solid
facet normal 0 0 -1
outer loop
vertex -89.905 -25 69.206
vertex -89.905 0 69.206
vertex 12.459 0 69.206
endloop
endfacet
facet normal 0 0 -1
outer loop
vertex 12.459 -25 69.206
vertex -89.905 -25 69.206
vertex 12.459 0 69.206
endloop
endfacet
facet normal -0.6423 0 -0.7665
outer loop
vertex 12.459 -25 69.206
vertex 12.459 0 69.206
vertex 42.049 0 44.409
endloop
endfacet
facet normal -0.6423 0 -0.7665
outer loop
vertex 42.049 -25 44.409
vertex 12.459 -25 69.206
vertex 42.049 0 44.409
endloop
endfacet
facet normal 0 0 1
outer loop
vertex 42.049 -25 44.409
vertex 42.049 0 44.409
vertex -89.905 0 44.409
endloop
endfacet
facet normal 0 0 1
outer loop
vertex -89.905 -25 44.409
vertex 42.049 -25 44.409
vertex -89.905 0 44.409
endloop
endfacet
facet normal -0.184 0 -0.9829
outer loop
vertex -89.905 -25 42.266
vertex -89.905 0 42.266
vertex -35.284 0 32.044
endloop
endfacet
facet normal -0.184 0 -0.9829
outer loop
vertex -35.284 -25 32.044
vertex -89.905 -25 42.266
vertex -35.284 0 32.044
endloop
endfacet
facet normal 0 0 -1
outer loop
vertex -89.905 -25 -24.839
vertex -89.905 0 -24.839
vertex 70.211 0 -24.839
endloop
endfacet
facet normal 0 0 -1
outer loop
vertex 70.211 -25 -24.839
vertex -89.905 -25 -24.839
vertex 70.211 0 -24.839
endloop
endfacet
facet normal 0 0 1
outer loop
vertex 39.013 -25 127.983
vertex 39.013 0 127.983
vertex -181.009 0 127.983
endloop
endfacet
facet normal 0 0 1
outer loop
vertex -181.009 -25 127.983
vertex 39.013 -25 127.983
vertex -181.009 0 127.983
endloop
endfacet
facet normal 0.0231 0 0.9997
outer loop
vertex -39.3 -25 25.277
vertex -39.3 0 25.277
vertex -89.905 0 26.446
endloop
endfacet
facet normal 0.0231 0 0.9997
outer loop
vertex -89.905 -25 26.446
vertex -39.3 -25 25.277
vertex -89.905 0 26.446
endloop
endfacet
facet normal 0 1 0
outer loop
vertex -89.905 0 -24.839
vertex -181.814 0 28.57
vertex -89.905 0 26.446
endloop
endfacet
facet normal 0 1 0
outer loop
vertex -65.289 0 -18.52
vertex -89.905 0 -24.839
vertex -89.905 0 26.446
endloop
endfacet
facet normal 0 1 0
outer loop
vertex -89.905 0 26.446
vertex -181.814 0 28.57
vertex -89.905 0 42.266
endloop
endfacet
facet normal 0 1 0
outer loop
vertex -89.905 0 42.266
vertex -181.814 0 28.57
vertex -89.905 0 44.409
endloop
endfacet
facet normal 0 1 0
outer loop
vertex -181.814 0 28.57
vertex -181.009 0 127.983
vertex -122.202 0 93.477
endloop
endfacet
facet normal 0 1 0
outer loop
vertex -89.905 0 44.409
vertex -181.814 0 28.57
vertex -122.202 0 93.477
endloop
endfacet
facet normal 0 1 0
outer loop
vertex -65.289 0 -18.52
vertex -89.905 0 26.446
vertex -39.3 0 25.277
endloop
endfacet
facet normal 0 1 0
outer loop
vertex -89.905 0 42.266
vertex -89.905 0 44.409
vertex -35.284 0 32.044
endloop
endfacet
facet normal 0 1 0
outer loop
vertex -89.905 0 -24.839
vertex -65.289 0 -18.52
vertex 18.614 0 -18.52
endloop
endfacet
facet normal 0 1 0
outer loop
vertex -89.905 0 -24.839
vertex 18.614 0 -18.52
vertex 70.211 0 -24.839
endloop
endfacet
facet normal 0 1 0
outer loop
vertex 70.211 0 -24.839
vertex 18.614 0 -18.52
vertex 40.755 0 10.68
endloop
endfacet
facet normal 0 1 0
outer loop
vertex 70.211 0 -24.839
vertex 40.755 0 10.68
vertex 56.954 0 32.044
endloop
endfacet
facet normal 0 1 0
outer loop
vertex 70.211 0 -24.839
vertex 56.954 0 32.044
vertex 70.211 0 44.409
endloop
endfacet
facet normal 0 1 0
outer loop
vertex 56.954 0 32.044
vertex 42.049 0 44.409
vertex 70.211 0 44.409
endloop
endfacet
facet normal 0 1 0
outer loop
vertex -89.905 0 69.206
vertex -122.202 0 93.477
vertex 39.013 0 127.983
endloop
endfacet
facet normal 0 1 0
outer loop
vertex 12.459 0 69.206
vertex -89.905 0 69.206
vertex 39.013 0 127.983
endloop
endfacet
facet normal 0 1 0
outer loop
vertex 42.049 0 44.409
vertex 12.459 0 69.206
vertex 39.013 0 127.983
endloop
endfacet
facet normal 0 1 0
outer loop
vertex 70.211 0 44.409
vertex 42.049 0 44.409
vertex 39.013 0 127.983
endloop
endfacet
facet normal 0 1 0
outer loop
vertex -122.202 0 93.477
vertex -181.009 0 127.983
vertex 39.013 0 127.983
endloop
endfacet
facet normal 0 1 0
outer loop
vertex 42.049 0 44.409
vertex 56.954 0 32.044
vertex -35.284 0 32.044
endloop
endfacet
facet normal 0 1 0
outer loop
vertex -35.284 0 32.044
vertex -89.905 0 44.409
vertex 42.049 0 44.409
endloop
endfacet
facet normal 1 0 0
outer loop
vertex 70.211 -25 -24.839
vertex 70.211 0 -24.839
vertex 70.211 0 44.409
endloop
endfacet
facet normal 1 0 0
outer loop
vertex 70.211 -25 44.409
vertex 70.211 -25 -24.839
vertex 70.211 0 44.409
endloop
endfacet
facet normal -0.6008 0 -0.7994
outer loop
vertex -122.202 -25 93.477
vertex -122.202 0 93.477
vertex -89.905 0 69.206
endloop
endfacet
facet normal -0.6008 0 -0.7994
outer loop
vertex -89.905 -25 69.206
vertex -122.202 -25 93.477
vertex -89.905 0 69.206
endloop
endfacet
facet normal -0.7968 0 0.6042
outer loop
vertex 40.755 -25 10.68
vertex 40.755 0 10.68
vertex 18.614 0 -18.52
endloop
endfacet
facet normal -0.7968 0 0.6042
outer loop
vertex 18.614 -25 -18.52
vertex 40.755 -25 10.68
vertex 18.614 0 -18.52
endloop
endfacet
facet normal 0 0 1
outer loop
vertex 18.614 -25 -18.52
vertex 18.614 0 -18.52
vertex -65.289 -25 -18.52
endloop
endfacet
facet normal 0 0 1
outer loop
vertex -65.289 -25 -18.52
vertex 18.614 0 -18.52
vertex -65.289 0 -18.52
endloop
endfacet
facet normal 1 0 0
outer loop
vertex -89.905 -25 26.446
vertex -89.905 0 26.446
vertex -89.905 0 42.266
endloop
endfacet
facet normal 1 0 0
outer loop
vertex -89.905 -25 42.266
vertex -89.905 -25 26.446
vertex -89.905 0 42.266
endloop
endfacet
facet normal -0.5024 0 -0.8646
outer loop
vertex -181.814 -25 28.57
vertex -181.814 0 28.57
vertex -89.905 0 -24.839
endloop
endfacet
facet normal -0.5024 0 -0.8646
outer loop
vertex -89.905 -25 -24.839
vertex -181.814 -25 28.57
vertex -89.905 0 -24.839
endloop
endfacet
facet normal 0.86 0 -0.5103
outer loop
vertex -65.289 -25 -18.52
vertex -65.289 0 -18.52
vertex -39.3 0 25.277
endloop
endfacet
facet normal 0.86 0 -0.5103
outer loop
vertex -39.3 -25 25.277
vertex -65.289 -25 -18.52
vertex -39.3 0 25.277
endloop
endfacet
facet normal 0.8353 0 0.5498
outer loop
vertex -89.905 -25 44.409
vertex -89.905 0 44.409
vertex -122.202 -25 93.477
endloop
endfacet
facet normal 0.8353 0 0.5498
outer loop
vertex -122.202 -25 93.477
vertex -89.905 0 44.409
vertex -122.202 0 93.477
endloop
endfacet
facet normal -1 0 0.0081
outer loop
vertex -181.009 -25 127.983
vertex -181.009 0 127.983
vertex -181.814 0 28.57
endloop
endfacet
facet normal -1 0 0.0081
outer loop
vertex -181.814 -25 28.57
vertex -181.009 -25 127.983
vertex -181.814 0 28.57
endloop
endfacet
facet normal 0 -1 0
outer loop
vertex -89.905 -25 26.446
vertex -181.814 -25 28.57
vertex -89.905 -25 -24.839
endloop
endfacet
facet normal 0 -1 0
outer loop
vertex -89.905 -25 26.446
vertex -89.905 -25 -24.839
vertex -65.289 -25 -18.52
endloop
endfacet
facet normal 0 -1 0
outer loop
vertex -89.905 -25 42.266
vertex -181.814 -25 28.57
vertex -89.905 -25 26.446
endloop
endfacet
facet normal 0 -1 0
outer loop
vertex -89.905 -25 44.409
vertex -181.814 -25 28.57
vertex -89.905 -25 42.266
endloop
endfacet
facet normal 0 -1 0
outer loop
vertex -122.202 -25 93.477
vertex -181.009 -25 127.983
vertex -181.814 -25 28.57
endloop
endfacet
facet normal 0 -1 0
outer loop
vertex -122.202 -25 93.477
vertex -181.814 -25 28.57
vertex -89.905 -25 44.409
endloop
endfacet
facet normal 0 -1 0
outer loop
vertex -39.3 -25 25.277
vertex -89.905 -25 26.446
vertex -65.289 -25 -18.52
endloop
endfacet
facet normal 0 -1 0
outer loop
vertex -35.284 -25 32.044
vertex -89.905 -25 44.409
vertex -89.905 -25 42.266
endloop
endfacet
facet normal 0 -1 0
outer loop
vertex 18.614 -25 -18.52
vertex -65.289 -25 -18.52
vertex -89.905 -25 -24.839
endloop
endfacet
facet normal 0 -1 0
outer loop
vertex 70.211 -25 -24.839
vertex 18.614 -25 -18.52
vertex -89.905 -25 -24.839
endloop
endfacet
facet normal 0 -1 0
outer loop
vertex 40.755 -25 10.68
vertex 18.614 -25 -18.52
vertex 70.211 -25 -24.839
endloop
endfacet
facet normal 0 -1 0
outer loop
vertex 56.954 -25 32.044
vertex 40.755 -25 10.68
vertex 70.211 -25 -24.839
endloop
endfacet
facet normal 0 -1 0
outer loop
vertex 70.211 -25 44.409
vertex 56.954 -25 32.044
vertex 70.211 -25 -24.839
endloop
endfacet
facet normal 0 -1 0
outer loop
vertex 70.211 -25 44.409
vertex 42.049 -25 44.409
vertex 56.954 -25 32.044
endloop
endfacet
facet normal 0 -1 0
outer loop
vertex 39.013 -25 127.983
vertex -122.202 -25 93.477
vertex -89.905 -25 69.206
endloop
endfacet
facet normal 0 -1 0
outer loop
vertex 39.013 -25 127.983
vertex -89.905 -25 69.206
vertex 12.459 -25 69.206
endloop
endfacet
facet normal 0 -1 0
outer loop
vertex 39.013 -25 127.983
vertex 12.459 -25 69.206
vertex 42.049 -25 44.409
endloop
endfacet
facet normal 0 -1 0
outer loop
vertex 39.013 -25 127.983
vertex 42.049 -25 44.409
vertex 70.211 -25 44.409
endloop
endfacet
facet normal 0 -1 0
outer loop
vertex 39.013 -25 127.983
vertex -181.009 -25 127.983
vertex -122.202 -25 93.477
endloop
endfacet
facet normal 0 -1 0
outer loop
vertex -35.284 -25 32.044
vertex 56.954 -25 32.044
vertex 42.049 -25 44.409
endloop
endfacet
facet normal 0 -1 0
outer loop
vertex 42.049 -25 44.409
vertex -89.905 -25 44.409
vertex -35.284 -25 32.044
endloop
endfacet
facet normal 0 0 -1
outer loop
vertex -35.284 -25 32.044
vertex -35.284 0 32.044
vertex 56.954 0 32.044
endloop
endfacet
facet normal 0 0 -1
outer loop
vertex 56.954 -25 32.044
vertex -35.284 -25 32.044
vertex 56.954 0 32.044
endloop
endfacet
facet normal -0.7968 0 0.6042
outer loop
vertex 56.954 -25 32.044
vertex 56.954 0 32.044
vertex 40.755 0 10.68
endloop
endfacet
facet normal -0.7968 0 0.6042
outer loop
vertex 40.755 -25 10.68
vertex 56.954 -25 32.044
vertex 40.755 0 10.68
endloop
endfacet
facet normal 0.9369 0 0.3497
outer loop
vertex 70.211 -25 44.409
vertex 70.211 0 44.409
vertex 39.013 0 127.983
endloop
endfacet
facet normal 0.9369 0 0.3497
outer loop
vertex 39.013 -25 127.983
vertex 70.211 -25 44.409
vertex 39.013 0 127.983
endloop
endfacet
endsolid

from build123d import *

# Parameters (mm, degrees)
F1_DEPTH = 25


with BuildPart() as f1:
    # F0 (on Front) → F1 (new body)
    with BuildSketch(Plane.XZ):
        Polygon((-89.9047479033, 42.2662571073), (-35.2840051055, 32.0440493524), (56.9544807076, 32.0440493524), (70.2112689614, 44.4089584053), (42.0486187137, 44.4089584053), (-89.9047479033, 44.4089584053), align=None)
        Polygon((70.2112689614, 44.4089584053), (56.9544807076, 32.0440493524), (40.7549355767, 10.6797787951), (70.2112689614, -24.8387977481), align=None)
        Polygon((-65.2892962098, -18.5195934027), (-39.2996874644, 25.2769919188), (-89.9047479033, 26.4464366573), (-89.9047479033, -24.8387977481), align=None)
        Polygon((-181.8143725395, 28.5703986883), (-89.9047479033, 42.2662571073), (-89.9047479033, 44.4089584053), (-181.0087710619, 127.9826015234), align=None)
        Polygon((-89.9047479033, 26.4464366573), (-89.9047479033, 42.2662571073), (-181.8143725395, 28.5703986883), align=None)
        Polygon((70.2112689614, -24.8387977481), (40.7549355767, 10.6797787951), (18.6143927276, -18.5195934027), align=None)
        Polygon((42.0486187137, 44.4089584053), (70.2112689614, 44.4089584053), (24.6596280485, 93.4770107269), (-122.2022771835, 93.4770107269), (-89.9047479033, 69.2056491971), (12.4589074403, 69.2056491971), align=None)
        Polygon((24.6596280485, 93.4770107269), (70.2112689614, 44.4089584053), (39.0130095184, 127.9826015234), (-181.0087710619, 127.9826015234), (-89.9047479033, 44.4089584053), (-122.2022771835, 93.4770107269), align=None)
        Polygon((18.6143927276, -18.5195934027), (-65.2892962098, -18.5195934027), (-89.9047479033, -24.8387977481), (70.2112689614, -24.8387977481), align=None)
        Polygon((-89.9047479033, -24.8387977481), (-89.9047479033, 26.4464366573), (-181.8143725395, 28.5703986883), align=None)
    extrude(amount=F1_DEPTH)


solid = f1.part
